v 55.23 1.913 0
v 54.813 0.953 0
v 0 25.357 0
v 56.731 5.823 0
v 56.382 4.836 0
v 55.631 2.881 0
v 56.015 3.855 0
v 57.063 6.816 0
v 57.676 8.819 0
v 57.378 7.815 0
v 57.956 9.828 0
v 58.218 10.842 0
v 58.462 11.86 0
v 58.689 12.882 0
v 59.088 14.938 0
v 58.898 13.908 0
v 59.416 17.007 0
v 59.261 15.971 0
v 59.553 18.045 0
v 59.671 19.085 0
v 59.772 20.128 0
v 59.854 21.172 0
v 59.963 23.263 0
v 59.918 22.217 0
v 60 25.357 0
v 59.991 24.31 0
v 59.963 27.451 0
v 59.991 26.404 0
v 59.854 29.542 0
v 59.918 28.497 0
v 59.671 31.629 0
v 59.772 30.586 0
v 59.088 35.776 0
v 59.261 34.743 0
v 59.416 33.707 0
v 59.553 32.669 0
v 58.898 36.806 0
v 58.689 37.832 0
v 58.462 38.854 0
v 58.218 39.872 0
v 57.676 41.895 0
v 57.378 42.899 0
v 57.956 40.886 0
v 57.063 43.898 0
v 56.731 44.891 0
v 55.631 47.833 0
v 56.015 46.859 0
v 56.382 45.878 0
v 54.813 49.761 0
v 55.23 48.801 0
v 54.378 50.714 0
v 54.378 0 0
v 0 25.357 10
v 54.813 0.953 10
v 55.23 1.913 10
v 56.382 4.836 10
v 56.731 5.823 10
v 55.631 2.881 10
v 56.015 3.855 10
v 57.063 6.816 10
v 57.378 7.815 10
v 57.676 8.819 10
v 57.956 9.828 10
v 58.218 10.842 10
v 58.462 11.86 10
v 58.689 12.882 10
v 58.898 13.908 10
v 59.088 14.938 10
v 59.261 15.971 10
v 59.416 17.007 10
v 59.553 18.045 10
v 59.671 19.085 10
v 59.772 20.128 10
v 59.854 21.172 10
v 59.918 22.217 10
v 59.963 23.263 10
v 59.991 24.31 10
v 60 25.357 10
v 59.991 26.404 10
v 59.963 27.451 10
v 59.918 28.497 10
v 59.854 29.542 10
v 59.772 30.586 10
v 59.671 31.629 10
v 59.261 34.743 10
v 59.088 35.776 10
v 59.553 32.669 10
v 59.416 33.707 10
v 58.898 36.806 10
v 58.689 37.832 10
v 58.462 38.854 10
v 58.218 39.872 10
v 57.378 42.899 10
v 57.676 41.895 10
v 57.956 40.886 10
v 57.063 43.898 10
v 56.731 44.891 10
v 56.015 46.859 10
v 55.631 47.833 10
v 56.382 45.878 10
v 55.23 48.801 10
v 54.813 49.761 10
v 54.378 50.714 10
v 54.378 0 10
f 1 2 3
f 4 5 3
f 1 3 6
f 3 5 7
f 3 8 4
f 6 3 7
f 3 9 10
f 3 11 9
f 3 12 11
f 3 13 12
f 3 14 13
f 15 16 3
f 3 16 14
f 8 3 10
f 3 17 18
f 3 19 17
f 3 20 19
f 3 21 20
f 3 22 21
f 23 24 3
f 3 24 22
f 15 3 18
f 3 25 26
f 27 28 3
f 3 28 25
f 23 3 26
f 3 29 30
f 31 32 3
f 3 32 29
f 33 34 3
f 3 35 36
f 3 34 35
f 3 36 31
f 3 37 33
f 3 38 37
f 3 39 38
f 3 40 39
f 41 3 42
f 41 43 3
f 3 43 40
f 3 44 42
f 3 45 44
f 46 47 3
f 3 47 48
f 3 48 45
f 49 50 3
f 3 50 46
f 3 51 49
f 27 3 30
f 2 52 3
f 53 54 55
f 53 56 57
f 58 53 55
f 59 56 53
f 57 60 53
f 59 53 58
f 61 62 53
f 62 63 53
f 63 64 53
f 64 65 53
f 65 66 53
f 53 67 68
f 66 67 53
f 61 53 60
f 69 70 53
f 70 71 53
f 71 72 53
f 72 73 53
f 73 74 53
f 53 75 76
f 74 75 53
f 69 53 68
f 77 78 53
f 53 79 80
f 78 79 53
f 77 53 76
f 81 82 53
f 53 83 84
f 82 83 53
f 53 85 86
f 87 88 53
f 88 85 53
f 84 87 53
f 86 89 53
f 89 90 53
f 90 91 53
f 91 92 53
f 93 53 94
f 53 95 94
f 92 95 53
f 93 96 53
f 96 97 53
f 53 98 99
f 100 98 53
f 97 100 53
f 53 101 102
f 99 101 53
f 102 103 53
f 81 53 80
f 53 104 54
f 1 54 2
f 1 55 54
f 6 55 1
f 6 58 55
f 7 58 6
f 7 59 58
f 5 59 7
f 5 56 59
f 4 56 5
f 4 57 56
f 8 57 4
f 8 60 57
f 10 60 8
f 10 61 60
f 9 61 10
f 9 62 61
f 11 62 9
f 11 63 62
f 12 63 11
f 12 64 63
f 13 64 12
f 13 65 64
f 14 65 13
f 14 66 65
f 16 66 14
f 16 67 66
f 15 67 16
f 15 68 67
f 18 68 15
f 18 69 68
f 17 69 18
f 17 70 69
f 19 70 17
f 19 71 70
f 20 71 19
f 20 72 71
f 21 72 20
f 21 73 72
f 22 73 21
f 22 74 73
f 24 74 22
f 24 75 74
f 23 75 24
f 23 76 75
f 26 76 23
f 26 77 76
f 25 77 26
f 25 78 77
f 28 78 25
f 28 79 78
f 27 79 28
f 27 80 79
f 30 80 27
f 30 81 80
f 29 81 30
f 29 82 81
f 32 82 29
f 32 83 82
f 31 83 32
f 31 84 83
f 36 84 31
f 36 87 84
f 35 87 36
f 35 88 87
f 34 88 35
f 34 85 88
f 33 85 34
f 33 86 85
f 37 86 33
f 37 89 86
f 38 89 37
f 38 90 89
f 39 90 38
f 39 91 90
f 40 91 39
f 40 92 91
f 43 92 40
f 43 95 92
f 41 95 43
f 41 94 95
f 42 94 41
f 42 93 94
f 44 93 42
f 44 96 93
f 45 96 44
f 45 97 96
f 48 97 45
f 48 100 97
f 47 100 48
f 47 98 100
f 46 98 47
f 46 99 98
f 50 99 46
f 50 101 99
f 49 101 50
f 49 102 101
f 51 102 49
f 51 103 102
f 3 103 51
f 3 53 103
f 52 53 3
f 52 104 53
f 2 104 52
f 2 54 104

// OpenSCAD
$fn = 32;

// ----------------------------------------------------------------------
// Arc profile plate: sector, 52 points
// ----------------------------------------------------------------------

// --- parameters (mm) ---
sector_angle = 50;        // sector angle, degrees
sector_r = 60;            // outer radius
arc_step = 1;             // sampling step of the arc, degrees
plate_t = 10;             // plate thickness, Z

bbox_x = 2 * sector_r * sin(sector_angle / 2);  // chord of the sector
bbox_y = sector_r;  // depth of the sector (apex to arc)

profile = [[54.378, 0], [54.813, 0.953], [55.23, 1.913], [55.631, 2.881], [56.015, 3.855], [56.382, 4.836], [56.731, 5.823], [57.063, 6.816], [57.378, 7.815], [57.676, 8.819], [57.956, 9.828], [58.218, 10.842], [58.462, 11.86], [58.689, 12.882], [58.898, 13.908], [59.088, 14.938], [59.261, 15.971], [59.416, 17.007], [59.553, 18.045], [59.671, 19.085], [59.772, 20.128], [59.854, 21.172], [59.918, 22.217], [59.963, 23.263], [59.991, 24.31], [60, 25.357], [59.991, 26.404], [59.963, 27.451], [59.918, 28.497], [59.854, 29.542], [59.772, 30.586], [59.671, 31.629], [59.553, 32.669], [59.416, 33.707], [59.261, 34.743], [59.088, 35.776], [58.898, 36.806], [58.689, 37.832], [58.462, 38.854], [58.218, 39.872], [57.956, 40.886], [57.676, 41.895], [57.378, 42.899], [57.063, 43.898], [56.731, 44.891], [56.382, 45.878], [56.015, 46.859], [55.631, 47.833], [55.23, 48.801], [54.813, 49.761], [54.378, 50.714], [0, 25.357]];  // primary outline, 52 points, counter clockwise

// --- the one profile operation ---
linear_extrude(height = plate_t) polygon(points = profile);
